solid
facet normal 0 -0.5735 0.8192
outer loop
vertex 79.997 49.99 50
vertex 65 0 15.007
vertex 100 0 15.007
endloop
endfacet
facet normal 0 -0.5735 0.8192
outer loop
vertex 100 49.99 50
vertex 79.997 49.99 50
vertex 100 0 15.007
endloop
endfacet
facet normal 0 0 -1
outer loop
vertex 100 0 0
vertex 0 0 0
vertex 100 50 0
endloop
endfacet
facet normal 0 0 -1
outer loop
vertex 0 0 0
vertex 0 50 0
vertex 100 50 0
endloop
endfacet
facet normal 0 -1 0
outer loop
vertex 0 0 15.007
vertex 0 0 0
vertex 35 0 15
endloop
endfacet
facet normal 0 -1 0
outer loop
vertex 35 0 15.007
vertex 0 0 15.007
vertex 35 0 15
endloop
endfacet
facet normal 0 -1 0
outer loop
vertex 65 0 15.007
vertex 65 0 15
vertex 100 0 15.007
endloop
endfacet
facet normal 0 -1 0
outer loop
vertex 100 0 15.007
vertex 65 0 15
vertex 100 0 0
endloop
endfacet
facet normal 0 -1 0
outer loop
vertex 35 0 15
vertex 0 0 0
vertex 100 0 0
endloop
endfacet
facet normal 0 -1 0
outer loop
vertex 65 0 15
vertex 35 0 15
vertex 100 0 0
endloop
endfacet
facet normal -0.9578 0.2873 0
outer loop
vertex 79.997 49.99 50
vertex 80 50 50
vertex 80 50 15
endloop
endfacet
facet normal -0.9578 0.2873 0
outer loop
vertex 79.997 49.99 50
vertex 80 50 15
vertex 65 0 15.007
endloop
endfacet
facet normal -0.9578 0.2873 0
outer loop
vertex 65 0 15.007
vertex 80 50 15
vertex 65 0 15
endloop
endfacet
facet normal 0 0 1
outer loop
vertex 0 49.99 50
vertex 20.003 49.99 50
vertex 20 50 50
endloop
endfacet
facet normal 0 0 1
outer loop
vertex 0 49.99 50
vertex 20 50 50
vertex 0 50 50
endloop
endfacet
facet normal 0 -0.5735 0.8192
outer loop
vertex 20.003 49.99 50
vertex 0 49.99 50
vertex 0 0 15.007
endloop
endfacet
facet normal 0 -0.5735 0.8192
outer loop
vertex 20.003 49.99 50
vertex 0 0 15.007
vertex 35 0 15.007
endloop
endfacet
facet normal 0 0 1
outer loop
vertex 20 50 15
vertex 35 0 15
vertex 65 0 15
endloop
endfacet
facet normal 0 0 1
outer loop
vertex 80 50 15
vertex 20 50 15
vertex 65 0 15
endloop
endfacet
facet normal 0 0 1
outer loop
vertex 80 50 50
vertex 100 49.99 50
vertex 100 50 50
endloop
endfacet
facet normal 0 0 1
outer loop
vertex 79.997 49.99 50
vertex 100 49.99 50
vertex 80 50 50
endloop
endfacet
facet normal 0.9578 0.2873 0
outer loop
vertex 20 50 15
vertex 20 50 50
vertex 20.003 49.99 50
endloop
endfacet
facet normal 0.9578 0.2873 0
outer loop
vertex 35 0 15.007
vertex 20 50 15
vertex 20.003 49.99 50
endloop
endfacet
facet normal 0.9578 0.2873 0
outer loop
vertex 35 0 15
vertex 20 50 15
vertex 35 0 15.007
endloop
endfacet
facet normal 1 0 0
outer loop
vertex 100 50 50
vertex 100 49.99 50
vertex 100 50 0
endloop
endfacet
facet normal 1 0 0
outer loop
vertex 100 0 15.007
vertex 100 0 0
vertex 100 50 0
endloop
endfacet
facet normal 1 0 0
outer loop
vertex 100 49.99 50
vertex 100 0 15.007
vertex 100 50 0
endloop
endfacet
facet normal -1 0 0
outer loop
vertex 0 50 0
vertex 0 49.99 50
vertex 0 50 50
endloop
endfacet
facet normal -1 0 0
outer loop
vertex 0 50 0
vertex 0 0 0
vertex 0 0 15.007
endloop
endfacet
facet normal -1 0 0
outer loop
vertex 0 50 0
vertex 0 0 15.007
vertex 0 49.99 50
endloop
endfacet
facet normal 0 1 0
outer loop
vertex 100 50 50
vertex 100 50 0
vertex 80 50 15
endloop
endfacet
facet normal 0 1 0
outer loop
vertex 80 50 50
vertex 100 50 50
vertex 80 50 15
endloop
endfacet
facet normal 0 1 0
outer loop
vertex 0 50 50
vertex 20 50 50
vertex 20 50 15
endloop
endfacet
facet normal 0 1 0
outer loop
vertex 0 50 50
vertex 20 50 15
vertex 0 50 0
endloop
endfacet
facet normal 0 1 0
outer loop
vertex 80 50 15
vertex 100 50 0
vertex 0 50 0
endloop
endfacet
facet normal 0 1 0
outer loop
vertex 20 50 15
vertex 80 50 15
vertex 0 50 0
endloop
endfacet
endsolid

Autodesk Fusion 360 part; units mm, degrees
sketch "Sketch1" plane through (0, 0, 0) normal (0, 0, 1) x (1, 0, 0)
  line L0 (0, 0) -> (100, 0)
  line L1 (0, 0) -> (0, 50)
  line L2 (0, 50) -> (100, 50)
  line L3 (100, 50) -> (100, 0)
  dimension "d1" = 100
  dimension "d2" = 50
extrude "Extrude1" add sketch "Sketch1" along normal blind 15
sketch "Sketch2" plane through (0, 0, 15) normal (0, 0, 1) x (-1, 0, 0)
  line L0 (0, 0) -> (-100, 0)
  line L1 (-100, 0) -> (-100, -50)
  line L2 (-100, -50) -> (0, -50)
  line L3 (0, -50) -> (0, 0)
  line L4 (-20, -50) -> (-35, 0)
  line L5 (-80, -50) -> (-65, 0)
  dimension "d6" = 35
  dimension "d7" = 20
  dimension "d8" = 35
  dimension "d9" = 20
extrude "Extrude2" add sketch "Sketch2" along normal blind 35 contours L0 L2 L3 L4
extrude "Extrude3" add sketch "Sketch2" along normal blind 35 contours L0 L1 L2 L5
chamfer "Chamfer1" distance 50 distance2 35 1 edges at (17.5, 0, 50) measured on face at (18.3333, 16.6667, 50)
chamfer "Chamfer1" distance 50 distance2 35 1 edges at (82.5, 0, 50) measured on face at (81.6667, 16.6667, 50)
